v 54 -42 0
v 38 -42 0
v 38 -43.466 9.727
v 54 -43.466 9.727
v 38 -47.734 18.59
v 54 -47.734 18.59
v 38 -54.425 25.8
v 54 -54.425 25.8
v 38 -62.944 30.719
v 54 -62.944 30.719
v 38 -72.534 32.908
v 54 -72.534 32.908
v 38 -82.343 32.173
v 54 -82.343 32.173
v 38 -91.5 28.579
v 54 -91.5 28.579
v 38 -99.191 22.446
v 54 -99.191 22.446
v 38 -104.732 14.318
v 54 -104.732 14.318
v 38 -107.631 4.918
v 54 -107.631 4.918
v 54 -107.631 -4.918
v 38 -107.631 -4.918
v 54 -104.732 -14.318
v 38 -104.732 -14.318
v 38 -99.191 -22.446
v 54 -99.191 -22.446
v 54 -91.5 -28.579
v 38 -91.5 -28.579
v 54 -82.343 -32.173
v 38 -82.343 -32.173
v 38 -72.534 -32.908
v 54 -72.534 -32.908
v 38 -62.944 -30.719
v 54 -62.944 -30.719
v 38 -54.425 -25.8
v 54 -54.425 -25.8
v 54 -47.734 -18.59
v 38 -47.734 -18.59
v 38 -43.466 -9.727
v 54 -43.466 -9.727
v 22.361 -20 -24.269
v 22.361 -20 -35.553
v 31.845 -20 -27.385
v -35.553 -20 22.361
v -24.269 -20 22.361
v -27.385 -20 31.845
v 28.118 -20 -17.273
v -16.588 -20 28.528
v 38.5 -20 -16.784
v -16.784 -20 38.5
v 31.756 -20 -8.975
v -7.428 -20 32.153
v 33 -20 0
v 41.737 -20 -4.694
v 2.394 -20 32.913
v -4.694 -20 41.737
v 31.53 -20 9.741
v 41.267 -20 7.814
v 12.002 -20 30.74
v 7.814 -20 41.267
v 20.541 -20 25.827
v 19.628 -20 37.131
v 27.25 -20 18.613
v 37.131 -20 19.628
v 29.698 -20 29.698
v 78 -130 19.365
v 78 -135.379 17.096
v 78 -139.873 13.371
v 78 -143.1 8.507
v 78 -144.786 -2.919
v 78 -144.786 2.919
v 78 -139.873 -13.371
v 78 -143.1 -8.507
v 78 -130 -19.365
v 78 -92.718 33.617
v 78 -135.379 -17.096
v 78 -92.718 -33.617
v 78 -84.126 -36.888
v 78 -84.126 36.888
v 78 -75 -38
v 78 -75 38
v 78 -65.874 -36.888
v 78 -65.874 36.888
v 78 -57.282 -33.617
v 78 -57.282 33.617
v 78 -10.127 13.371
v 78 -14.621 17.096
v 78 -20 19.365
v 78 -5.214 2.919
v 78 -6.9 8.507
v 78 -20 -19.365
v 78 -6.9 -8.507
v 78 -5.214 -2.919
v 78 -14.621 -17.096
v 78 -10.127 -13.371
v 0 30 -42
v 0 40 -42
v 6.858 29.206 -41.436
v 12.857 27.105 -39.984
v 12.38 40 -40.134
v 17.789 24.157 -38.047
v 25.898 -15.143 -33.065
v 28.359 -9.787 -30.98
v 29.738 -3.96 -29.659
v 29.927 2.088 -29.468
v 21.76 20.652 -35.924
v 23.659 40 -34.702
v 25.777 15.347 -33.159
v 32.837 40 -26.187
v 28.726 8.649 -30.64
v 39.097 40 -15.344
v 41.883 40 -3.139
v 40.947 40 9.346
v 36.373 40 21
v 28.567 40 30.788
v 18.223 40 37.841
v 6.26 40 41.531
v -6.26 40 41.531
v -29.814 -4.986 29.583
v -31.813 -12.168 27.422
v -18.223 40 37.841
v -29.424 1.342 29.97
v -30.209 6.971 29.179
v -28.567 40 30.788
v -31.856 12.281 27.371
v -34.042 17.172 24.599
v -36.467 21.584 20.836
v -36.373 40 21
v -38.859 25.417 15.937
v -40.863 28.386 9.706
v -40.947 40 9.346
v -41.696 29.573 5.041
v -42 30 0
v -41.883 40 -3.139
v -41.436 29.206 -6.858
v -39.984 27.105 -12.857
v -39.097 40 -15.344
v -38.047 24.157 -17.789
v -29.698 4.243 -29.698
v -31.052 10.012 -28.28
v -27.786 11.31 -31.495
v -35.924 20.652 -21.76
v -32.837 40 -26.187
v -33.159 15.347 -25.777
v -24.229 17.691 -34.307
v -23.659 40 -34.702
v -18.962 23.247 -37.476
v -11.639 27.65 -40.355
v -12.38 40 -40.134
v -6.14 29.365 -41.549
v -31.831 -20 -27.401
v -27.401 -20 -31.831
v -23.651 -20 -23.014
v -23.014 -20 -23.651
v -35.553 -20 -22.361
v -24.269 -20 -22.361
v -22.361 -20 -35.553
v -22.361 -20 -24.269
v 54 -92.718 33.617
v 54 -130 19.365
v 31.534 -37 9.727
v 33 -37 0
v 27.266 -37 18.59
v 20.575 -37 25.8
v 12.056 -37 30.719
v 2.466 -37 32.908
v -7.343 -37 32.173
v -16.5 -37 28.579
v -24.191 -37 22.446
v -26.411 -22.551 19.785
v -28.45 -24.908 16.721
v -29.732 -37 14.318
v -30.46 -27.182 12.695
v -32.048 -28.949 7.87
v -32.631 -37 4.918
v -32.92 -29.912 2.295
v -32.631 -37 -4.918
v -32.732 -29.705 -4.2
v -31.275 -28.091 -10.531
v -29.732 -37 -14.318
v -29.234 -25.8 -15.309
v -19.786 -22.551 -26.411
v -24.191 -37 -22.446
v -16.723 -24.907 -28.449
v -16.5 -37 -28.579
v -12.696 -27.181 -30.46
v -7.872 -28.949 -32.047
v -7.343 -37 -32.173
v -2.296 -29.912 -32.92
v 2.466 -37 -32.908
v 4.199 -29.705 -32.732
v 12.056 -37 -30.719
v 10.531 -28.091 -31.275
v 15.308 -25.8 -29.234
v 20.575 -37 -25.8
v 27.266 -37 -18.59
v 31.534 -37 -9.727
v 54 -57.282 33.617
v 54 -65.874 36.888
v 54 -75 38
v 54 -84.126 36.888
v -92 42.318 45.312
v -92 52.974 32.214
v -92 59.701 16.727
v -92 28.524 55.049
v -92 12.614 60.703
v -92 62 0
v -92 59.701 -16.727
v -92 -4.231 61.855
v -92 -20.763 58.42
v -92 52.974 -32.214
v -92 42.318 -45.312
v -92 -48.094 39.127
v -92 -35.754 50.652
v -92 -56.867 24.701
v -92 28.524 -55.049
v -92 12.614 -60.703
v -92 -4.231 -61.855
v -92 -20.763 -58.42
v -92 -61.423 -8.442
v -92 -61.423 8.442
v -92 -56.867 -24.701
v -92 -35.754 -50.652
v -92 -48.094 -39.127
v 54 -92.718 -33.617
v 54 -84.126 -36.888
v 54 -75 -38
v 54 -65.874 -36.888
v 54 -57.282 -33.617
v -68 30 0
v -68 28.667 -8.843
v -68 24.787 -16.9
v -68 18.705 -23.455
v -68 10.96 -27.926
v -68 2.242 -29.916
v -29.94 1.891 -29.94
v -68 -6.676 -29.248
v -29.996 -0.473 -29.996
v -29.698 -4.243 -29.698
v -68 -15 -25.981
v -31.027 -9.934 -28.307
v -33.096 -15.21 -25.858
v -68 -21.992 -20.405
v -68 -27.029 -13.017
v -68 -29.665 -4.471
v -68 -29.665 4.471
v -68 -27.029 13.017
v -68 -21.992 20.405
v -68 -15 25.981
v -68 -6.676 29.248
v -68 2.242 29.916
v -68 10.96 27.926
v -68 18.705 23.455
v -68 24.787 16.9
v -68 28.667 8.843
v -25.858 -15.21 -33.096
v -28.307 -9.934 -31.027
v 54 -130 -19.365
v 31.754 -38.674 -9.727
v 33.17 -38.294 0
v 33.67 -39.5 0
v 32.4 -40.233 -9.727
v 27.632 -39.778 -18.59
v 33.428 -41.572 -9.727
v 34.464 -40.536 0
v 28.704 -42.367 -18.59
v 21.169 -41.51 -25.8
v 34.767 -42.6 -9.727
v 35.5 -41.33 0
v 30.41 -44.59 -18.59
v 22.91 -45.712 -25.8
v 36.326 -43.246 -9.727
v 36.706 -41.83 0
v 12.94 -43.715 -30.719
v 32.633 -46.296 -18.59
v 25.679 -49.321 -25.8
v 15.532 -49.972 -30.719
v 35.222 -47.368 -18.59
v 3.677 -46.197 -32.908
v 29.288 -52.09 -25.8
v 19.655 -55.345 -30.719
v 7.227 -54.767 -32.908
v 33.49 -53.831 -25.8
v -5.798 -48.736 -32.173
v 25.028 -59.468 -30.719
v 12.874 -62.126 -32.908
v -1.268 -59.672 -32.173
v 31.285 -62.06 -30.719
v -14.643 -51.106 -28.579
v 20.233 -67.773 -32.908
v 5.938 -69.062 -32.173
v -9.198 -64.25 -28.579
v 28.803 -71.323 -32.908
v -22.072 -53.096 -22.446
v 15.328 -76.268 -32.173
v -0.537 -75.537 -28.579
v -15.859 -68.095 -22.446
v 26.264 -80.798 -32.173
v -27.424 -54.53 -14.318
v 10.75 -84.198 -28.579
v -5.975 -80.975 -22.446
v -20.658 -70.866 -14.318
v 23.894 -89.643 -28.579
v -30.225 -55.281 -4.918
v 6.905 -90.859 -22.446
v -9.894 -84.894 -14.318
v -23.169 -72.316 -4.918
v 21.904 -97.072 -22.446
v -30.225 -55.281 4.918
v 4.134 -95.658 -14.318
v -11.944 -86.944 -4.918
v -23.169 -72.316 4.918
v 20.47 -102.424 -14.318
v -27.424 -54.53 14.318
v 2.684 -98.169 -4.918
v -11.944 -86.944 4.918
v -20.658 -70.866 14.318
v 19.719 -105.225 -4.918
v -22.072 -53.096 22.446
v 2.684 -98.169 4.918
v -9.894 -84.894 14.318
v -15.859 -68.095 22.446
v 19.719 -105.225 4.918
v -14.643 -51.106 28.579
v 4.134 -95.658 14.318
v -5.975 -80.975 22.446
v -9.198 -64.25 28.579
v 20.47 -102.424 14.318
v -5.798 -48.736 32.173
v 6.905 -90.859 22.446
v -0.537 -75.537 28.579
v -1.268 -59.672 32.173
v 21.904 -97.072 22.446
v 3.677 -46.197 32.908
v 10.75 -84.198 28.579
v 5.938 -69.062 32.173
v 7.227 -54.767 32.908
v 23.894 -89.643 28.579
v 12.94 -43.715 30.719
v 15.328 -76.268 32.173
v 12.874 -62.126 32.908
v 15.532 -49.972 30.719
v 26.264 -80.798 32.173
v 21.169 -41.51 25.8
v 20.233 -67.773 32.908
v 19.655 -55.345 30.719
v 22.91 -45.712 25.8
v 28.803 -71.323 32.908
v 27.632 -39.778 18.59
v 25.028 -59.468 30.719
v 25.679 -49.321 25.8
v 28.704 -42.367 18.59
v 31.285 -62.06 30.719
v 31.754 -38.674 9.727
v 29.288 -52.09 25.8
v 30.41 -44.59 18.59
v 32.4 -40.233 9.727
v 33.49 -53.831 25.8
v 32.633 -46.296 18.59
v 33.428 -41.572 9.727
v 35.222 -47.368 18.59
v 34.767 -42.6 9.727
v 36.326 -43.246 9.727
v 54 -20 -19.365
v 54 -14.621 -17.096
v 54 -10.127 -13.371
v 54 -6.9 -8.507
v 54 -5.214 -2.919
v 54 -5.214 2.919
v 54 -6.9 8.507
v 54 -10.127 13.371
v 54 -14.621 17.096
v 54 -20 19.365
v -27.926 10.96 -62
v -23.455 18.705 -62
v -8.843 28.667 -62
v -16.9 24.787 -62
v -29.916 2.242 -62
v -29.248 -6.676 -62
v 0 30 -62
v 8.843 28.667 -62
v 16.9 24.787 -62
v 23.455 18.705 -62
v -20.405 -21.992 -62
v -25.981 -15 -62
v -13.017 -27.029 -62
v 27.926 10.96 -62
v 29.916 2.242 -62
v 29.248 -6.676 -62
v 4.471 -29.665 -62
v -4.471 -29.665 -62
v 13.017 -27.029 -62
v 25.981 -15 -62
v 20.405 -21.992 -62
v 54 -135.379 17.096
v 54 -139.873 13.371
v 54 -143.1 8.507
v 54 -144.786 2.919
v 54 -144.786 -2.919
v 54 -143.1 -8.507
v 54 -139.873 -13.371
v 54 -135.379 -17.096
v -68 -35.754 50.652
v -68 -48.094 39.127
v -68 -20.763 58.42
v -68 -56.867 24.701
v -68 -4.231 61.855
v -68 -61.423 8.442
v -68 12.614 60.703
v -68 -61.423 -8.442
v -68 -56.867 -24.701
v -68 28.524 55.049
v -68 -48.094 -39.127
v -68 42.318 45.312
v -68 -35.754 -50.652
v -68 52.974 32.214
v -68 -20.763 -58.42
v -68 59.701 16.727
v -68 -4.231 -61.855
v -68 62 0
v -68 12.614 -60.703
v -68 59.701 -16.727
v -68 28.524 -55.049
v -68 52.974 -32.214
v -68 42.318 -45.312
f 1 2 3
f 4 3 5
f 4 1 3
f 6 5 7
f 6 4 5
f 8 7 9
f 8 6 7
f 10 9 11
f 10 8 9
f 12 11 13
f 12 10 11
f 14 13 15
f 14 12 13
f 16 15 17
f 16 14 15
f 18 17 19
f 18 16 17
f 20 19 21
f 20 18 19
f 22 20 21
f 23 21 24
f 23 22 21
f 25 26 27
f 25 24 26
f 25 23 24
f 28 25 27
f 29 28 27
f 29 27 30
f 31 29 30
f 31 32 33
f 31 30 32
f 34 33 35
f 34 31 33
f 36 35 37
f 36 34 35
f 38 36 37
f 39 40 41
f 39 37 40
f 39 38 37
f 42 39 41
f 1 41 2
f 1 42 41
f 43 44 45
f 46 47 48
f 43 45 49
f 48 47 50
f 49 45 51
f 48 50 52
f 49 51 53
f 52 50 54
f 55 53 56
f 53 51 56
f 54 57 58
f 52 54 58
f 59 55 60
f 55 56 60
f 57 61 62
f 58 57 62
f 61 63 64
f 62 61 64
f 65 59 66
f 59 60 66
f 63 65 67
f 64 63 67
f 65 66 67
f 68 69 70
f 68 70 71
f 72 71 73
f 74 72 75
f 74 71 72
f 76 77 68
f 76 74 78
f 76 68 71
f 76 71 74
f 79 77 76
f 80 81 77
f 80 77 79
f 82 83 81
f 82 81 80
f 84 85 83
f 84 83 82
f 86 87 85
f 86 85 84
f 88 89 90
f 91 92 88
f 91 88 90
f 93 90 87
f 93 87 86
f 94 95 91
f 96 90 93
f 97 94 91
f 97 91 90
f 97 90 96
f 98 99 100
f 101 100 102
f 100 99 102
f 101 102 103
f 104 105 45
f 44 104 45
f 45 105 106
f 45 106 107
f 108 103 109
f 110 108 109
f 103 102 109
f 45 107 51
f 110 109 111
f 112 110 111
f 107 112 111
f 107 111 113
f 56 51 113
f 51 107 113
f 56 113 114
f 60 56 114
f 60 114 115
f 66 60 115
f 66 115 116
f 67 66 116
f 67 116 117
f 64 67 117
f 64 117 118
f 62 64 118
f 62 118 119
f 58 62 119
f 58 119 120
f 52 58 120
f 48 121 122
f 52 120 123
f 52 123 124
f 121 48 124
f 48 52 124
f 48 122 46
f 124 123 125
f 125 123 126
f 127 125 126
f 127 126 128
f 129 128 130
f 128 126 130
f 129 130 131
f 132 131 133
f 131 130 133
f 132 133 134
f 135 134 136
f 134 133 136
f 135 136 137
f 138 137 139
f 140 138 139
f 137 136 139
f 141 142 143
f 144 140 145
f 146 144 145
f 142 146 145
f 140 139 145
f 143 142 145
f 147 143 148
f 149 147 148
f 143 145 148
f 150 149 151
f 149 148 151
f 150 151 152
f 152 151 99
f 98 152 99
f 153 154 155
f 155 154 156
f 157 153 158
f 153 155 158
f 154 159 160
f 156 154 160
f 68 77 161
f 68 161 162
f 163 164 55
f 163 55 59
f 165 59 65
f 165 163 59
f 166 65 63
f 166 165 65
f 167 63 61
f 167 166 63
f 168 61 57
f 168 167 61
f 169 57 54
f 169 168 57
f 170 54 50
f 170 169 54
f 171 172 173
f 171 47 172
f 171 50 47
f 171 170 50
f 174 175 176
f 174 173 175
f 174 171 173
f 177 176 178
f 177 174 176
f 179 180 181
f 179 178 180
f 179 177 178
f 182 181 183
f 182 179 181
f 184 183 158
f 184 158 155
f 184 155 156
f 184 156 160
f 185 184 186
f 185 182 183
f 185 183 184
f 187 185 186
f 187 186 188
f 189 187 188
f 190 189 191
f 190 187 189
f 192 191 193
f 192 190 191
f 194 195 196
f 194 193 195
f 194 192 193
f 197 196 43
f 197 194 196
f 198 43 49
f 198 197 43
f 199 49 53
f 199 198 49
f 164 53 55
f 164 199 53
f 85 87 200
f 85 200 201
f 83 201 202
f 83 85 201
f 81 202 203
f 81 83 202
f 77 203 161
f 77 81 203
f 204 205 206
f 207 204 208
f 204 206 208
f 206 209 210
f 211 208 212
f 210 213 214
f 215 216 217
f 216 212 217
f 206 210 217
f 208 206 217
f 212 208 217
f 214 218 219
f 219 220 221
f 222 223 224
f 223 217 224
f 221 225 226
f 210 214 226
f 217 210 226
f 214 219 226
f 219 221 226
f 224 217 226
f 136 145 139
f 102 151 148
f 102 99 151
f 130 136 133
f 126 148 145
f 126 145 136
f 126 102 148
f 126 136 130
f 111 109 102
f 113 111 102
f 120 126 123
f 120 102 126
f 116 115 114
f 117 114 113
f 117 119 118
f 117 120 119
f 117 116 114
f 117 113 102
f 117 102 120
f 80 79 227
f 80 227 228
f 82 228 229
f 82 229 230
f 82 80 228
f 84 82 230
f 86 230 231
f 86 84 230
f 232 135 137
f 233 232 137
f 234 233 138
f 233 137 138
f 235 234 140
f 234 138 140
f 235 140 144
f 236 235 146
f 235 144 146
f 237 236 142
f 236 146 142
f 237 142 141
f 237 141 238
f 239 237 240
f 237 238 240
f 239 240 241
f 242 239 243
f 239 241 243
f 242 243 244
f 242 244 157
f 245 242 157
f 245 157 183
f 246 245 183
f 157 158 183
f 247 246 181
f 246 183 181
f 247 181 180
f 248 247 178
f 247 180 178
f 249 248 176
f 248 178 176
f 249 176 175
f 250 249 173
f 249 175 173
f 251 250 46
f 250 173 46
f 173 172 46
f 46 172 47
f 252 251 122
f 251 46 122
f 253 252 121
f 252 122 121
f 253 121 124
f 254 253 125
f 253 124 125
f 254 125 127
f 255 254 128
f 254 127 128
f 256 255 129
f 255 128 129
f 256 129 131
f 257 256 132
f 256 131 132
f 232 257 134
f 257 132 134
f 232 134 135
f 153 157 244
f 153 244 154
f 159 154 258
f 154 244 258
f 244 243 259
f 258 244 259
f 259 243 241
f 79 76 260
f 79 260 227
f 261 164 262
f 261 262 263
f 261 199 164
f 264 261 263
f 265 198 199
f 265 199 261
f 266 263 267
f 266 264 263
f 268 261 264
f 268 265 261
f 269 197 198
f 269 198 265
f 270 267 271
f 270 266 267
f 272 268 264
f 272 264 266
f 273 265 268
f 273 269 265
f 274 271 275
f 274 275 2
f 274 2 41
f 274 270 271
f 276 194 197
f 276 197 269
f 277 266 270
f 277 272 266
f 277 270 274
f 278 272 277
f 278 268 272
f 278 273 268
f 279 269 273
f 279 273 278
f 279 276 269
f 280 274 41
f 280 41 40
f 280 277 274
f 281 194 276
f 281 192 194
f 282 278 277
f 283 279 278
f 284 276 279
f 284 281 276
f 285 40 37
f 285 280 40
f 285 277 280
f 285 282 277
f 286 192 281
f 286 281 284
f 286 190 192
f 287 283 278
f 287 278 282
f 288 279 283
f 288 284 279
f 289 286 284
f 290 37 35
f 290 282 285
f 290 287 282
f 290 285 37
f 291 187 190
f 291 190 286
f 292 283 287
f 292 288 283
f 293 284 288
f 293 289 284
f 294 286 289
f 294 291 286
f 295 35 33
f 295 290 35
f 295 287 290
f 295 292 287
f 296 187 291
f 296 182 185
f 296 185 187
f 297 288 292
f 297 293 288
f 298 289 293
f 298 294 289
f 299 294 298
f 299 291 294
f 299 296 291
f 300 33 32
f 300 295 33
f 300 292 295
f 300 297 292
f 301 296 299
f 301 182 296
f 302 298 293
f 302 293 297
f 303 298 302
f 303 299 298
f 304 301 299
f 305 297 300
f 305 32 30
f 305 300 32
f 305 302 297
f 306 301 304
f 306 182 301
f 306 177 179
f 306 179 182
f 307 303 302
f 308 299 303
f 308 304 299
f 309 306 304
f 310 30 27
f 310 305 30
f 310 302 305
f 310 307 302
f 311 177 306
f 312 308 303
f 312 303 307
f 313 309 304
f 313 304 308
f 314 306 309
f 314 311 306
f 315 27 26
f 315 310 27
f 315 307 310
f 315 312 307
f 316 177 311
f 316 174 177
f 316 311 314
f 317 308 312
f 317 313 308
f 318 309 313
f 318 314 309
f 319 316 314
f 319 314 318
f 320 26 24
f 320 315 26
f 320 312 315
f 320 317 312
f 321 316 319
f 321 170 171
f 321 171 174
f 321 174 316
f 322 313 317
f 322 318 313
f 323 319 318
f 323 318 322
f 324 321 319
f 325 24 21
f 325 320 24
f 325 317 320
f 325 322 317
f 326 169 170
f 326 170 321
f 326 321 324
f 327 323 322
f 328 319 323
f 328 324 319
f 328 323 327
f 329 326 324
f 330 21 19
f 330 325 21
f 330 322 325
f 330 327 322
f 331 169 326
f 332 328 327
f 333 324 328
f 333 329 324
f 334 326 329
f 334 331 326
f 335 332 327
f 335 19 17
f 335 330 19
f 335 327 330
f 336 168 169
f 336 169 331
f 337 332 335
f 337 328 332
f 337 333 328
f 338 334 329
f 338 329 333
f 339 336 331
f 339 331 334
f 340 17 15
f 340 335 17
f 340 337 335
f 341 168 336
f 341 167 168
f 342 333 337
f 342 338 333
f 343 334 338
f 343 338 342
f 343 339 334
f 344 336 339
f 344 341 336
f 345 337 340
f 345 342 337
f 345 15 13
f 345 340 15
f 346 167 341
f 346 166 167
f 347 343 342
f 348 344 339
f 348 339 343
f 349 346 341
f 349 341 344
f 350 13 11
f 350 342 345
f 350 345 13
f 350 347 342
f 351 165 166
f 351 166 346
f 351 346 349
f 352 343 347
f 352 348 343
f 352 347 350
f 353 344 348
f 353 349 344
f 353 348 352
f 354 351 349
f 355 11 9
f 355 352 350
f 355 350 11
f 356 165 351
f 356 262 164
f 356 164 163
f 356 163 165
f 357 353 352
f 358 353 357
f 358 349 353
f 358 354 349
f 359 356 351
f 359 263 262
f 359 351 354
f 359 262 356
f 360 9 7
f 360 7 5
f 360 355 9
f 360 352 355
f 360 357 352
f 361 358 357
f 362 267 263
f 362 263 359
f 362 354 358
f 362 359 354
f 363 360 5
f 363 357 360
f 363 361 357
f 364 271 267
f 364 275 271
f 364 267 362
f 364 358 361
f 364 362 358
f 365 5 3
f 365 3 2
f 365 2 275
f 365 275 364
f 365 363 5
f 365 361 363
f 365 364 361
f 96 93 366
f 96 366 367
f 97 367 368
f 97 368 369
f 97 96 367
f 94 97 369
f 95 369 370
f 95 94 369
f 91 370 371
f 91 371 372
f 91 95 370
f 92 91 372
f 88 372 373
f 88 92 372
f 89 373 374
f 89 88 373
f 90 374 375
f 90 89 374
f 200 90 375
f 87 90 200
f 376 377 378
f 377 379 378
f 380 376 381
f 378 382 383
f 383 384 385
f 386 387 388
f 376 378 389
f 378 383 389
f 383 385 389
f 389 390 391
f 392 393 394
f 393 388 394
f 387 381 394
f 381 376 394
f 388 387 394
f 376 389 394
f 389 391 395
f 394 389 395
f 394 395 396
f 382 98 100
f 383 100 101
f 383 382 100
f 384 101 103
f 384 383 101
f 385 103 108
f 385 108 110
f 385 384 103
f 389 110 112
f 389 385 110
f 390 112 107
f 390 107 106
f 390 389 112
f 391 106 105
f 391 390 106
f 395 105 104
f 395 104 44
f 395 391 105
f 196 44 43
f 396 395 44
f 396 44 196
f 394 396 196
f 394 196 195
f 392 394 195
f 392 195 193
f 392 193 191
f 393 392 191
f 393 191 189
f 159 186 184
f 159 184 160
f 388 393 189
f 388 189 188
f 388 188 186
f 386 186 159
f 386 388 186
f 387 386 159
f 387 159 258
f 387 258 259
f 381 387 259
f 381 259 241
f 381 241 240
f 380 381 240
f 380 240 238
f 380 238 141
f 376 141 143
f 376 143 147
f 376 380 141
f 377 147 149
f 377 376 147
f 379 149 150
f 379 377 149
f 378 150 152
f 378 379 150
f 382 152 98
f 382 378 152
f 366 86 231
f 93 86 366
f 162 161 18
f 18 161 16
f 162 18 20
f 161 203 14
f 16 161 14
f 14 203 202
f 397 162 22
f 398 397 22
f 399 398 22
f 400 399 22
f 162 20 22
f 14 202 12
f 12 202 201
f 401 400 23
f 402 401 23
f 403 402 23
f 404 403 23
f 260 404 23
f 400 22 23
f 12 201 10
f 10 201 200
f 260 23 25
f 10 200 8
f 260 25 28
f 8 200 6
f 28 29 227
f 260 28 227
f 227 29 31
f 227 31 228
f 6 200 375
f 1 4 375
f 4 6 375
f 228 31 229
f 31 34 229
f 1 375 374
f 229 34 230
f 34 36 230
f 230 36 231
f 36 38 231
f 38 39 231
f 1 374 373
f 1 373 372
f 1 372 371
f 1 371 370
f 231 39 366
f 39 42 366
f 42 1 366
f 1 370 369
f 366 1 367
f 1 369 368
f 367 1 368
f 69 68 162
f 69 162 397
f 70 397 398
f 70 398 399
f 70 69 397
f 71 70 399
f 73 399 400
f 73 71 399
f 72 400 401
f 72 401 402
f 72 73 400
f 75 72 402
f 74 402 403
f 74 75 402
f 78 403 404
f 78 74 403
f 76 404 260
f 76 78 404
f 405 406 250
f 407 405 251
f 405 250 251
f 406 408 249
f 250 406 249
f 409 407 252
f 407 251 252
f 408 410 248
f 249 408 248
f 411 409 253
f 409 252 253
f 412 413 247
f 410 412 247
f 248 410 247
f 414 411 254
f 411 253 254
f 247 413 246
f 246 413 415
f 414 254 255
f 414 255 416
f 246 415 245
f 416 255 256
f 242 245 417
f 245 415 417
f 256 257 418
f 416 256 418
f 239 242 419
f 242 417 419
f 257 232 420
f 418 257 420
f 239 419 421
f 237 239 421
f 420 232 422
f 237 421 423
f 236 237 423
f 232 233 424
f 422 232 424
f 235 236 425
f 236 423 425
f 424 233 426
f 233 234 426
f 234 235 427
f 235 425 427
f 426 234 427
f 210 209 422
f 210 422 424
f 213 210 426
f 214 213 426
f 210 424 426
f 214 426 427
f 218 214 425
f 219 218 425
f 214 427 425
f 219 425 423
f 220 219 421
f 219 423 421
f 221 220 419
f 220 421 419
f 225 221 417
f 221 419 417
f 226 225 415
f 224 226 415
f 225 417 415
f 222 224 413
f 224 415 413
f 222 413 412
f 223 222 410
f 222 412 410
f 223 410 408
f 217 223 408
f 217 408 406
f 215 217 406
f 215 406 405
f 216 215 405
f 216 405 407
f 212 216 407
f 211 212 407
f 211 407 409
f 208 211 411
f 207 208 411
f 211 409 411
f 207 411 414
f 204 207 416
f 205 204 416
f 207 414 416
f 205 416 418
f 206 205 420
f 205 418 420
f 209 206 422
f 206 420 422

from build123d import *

# Parameters (mm, degrees)
SKETCH2_W           = 42
SKETCH2_H           = 60
SKETCH3_R           = 33
BOSS_EXTRUDE1_DEPTH = 24
SKETCH6_W           = 62
SKETCH6_H           = 30


with BuildPart() as part:
    # Sketch1 → Revolve1 (revolve)
    with BuildSketch(Plane.XY):
        Polygon((-92, 0), (-92, 62), (-68, 62), (-68, 30), (0, 30), (0, 0), align=None)
    revolve(axis=Axis((0, 0, 0), (-1, 0, 0)))

    # Sketch2 → Revolve2 (revolve)
    with BuildSketch(Plane(origin=(0, 0, 0), x_dir=(0, 0, -1), z_dir=(1, 0, 0))):
        with Locations((21, 10)):
            Rectangle(SKETCH2_W, SKETCH2_H)
    revolve(axis=Axis((0, 40, 0), (0, -1, 0)))

    # Sweep1: sweep along a path in Sketch4
    with BuildLine(Plane.XY) as sweep1_path:
        Line((0, -20), (0, -37))
        ThreePointArc((0, -37), (11.129942315, -63.870057685), (38, -75))
        Line((38, -75), (78, -75))
    # Sketch3 → Sweep1 (sweep)
    with BuildSketch(Plane.XZ.offset(20)):
        Circle(SKETCH3_R)
    sweep(path=sweep1_path.line)

    # Sketch5 → Boss-Extrude1 (add)
    with BuildSketch(Plane(origin=(78, 0, 0), x_dir=(0, 0, -1), z_dir=(1, 0, 0))):
        with BuildLine():
            Line((-19.364916731, -20), (-33.616565645, -57.282028495))
            ThreePointArc((-33.616565645, -57.282028495), (-38, -75), (-33.616565645, -92.717971505))
            Line((-33.616565645, -92.717971505), (-19.364916731, -130))
            ThreePointArc((-19.364916731, -130), (0, -145), (19.364916731, -130))
            Line((19.364916731, -130), (33.616565645, -92.717971505))
            ThreePointArc((33.616565645, -92.717971505), (38, -75), (33.616565645, -57.282028495))
            Line((33.616565645, -57.282028495), (19.364916731, -20))
            ThreePointArc((19.364916731, -20), (0, -5), (-19.364916731, -20))
        make_face()
    extrude(amount=-BOSS_EXTRUDE1_DEPTH)

    # Sketch6 → Revolve3 (revolve)
    with BuildSketch(Plane(origin=(0, 0, 0), x_dir=(0, 0, -1), z_dir=(1, 0, 0))):
        with Locations((31, 15)):
            Rectangle(SKETCH6_W, SKETCH6_H)
    revolve(axis=Axis((0, 0, 0), (0, 0, -1)))


solid = part.part
